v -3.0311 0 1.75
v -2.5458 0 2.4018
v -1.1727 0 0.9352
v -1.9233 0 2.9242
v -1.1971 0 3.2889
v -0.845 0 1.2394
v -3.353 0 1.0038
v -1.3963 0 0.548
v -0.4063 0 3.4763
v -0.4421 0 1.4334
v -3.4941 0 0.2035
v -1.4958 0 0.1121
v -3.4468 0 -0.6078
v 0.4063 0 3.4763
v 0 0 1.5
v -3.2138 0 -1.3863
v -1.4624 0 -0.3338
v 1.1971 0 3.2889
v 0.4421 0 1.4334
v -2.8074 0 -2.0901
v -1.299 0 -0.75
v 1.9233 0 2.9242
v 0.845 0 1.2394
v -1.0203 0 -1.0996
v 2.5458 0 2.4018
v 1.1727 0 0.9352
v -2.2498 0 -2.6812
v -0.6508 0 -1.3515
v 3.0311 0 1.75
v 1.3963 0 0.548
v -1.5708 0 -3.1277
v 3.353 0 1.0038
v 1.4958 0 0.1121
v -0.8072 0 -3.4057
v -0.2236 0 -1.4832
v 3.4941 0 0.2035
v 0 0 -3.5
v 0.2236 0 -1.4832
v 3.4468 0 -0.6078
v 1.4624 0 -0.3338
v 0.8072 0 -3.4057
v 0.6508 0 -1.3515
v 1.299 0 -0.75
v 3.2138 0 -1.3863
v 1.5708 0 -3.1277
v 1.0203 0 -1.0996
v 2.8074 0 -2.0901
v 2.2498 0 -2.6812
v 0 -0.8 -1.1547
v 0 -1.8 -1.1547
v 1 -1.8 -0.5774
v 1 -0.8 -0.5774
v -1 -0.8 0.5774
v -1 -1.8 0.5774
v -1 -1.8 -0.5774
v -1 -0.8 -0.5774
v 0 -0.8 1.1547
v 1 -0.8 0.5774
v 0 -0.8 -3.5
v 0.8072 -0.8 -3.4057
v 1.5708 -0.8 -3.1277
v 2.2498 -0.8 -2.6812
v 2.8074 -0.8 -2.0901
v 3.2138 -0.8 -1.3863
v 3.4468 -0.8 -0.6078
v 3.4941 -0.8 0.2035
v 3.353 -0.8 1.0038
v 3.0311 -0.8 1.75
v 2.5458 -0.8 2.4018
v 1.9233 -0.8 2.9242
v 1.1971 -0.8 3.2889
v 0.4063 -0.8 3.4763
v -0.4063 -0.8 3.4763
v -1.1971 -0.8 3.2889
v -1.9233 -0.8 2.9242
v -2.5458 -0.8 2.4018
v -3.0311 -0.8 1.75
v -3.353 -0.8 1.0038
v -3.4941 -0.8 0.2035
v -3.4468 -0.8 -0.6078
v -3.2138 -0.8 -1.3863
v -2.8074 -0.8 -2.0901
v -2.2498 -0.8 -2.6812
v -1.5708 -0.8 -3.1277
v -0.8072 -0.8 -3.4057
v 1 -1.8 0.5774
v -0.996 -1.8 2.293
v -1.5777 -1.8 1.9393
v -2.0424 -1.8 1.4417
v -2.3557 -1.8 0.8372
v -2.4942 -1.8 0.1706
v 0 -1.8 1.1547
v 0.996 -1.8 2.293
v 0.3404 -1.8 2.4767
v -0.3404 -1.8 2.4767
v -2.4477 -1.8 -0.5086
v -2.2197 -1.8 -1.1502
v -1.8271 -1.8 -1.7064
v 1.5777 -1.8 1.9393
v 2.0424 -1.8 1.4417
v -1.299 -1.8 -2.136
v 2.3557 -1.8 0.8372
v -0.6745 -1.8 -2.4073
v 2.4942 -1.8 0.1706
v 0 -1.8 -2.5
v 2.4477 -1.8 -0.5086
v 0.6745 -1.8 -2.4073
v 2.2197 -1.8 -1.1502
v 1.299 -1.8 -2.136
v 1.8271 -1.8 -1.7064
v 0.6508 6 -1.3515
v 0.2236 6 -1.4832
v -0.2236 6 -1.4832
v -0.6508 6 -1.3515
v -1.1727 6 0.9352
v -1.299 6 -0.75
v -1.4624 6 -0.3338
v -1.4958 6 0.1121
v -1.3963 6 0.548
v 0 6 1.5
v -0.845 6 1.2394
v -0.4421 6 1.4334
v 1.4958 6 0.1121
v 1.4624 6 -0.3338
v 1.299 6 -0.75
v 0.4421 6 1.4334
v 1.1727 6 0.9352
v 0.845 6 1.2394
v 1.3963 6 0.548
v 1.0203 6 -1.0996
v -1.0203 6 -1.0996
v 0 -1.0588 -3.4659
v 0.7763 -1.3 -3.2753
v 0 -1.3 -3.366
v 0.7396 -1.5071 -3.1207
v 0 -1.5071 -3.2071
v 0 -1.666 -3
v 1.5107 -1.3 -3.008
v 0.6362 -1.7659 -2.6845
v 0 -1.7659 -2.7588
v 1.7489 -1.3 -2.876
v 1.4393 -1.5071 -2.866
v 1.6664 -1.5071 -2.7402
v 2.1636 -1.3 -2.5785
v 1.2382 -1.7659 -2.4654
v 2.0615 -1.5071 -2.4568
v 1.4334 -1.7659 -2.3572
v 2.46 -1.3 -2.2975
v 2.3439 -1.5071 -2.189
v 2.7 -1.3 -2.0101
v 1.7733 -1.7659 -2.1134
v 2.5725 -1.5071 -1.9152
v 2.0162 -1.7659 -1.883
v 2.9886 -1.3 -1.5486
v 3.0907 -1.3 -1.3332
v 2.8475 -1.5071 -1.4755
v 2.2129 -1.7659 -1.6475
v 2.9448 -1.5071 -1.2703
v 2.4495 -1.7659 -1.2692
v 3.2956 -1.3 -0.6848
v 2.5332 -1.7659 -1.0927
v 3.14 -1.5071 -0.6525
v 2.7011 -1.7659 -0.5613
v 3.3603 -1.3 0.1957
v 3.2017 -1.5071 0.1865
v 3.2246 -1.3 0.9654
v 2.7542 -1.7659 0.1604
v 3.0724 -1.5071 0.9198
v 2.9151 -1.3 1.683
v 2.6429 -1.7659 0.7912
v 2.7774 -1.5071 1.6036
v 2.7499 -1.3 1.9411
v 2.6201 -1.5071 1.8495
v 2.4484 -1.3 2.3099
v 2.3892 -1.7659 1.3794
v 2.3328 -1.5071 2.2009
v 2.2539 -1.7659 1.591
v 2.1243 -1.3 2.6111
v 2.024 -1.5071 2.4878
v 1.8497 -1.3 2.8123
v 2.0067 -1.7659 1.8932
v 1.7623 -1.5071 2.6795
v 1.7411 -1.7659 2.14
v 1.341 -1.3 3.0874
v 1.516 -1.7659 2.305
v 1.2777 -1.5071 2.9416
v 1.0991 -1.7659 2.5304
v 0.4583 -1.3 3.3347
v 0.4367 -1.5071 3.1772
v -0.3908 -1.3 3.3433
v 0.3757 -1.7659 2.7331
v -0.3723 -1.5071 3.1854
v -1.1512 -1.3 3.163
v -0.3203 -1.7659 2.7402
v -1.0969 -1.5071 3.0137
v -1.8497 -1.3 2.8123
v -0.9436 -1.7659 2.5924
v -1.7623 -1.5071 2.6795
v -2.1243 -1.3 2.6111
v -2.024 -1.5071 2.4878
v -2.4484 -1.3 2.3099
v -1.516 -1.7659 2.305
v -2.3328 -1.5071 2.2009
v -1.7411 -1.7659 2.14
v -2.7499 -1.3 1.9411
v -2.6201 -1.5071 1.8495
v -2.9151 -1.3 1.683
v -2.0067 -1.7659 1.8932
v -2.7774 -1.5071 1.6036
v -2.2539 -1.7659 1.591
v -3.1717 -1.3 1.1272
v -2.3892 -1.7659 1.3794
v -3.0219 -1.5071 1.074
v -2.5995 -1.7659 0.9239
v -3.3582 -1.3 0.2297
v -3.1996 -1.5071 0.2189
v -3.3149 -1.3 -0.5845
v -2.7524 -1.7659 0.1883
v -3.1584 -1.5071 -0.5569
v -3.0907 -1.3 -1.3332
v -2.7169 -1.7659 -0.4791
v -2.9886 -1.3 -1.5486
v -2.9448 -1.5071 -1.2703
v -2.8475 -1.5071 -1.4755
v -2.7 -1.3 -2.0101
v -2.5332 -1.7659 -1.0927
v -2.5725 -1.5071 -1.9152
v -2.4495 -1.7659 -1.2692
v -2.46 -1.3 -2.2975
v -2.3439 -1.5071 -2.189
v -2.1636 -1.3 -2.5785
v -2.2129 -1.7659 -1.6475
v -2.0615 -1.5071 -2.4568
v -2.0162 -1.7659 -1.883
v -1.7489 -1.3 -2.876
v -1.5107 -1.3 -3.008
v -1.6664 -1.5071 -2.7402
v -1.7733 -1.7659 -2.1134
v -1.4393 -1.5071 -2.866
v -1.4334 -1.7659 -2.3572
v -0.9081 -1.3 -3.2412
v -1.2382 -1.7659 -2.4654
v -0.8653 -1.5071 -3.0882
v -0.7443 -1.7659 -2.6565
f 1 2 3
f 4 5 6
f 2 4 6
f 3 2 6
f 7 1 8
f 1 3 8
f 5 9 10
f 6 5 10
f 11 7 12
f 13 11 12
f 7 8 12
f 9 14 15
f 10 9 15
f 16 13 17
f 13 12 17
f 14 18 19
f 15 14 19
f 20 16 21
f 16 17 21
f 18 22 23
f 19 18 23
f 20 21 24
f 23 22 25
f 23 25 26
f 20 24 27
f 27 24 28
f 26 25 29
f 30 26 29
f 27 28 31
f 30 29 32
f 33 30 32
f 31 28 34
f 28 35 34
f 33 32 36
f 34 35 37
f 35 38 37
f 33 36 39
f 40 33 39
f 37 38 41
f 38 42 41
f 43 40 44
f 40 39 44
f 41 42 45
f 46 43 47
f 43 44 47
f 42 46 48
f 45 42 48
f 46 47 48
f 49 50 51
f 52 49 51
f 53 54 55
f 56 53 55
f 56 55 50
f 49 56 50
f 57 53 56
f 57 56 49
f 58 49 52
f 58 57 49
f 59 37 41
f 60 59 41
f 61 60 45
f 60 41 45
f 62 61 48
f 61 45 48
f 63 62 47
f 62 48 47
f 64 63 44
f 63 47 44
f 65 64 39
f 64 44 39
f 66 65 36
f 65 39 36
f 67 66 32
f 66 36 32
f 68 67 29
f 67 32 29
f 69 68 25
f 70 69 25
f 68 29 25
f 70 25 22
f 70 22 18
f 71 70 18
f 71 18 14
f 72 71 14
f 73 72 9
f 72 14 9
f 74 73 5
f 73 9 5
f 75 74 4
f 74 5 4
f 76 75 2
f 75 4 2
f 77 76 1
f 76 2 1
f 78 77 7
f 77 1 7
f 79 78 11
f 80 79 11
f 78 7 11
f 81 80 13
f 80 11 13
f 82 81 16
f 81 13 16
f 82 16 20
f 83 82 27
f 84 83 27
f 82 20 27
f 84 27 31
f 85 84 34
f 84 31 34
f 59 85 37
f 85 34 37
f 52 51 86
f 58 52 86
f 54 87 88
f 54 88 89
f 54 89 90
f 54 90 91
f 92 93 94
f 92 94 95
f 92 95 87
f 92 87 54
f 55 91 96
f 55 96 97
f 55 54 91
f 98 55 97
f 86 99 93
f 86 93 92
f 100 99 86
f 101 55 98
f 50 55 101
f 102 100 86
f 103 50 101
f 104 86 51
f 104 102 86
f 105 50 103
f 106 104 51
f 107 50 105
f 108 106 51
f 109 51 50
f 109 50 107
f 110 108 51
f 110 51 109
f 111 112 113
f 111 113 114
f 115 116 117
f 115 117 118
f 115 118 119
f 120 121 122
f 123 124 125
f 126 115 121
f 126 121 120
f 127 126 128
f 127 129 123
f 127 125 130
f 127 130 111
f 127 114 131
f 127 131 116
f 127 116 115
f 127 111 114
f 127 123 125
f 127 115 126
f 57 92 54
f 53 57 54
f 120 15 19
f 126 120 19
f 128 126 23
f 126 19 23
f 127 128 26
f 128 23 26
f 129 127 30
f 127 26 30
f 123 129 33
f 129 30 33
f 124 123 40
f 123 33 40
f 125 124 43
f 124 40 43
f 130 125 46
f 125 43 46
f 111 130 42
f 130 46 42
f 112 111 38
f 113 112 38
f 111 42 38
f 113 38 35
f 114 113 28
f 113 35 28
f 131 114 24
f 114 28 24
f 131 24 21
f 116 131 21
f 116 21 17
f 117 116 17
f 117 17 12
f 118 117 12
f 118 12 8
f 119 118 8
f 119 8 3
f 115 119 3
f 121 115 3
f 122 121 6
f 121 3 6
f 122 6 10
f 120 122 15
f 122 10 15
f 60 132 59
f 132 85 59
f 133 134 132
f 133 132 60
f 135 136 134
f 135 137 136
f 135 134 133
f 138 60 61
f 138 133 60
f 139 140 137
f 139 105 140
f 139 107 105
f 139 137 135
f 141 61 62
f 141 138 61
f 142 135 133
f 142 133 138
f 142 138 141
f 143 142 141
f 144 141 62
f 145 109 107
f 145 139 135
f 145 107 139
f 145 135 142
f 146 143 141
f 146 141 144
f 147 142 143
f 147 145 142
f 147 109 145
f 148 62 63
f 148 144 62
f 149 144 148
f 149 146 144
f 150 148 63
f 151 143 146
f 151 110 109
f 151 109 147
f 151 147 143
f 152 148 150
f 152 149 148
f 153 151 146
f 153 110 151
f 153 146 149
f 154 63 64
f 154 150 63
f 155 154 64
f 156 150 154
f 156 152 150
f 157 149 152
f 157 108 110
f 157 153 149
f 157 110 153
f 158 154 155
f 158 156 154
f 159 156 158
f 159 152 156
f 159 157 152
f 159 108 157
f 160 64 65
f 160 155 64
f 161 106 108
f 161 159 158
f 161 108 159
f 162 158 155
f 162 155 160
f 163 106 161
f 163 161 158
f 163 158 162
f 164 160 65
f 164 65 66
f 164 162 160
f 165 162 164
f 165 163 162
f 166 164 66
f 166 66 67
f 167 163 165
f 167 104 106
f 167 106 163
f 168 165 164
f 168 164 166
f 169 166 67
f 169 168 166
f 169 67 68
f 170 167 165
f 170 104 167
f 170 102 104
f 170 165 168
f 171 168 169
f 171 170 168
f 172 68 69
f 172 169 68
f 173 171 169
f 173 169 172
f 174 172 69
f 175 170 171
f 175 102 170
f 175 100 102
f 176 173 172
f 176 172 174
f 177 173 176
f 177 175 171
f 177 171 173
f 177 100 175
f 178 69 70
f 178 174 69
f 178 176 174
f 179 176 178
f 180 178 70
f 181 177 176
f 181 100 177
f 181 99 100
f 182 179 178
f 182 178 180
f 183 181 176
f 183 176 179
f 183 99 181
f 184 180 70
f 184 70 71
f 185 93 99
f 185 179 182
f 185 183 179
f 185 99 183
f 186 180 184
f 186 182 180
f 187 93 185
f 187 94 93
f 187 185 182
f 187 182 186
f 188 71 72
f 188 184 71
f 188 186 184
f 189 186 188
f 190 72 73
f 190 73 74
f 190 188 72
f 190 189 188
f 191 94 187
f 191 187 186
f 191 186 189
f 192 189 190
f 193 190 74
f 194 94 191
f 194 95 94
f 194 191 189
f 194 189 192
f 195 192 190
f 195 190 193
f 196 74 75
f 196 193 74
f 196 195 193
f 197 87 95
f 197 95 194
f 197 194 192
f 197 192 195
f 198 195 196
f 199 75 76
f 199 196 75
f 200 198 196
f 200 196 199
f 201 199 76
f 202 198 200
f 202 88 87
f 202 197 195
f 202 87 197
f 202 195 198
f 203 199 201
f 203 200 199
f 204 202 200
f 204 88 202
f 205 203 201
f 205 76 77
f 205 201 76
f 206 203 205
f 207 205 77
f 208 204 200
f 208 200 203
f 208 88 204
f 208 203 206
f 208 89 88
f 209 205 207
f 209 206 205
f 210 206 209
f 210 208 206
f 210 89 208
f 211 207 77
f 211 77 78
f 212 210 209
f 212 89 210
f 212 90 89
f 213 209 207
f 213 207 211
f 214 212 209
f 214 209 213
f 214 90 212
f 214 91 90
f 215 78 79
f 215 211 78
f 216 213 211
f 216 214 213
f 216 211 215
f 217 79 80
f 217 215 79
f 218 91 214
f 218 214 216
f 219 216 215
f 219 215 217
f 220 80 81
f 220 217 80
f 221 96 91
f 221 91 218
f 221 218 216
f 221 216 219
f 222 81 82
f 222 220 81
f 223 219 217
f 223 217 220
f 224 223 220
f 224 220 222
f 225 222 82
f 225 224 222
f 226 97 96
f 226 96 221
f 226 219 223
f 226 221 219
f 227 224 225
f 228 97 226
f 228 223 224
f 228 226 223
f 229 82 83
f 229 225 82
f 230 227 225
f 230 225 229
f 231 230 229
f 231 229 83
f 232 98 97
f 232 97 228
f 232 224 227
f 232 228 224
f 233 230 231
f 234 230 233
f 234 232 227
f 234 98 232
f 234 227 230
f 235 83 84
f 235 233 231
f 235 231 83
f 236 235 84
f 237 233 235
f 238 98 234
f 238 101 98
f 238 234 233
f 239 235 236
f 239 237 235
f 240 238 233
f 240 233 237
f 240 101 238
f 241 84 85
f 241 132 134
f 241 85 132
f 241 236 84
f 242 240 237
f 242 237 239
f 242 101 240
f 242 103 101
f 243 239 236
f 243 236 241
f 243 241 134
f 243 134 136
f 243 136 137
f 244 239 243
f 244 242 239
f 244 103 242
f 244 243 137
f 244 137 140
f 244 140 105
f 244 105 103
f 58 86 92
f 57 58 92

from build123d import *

# Parameters (mm, degrees)
SKETCH_1_R          = 1.5
EXTRUDE_1_DEPTH     = 6
SKETCH_2_R          = 3.5
EXTRUDE_2_DEPTH     = 1.8
CUT_EXTRUDE_1_DEPTH = 1
FILLET_1_R          = 1


with BuildPart() as part:
    # 草图1 → 凸台-拉伸1 (new body)
    with BuildSketch(Plane(origin=(0, 0, 0), x_dir=(1, 0, 0), z_dir=(0, 1, 0))):
        with Locations(Location((0, 0, 0), (0, 0, 270))):
            Circle(SKETCH_1_R)
    extrude(amount=EXTRUDE_1_DEPTH)

    # 草图2 → 凸台-拉伸2 (add)
    with BuildSketch(Plane.XZ):
        with Locations(Location((0, 0, 0), (0, 0, 270))):
            Circle(SKETCH_2_R)
    extrude(amount=EXTRUDE_2_DEPTH)

    # 草图3 → 切除-拉伸1 (cut)
    with BuildSketch(Plane.XZ.offset(1.8)):
        Polygon((1, 0.577350269), (0, 1.154700538), (-1, 0.577350269), (-1, -0.577350269), (0, -1.154700538), (1, -0.577350269), align=None)
    extrude(amount=-CUT_EXTRUDE_1_DEPTH, mode=Mode.SUBTRACT)

    # 圆角1
    fillet_1_edges = [part.edges().sort_by_distance(p)[0] for p in [
        (0, -1.8, 3.5),
    ]]
    fillet(fillet_1_edges, radius=FILLET_1_R)


solid = part.part
